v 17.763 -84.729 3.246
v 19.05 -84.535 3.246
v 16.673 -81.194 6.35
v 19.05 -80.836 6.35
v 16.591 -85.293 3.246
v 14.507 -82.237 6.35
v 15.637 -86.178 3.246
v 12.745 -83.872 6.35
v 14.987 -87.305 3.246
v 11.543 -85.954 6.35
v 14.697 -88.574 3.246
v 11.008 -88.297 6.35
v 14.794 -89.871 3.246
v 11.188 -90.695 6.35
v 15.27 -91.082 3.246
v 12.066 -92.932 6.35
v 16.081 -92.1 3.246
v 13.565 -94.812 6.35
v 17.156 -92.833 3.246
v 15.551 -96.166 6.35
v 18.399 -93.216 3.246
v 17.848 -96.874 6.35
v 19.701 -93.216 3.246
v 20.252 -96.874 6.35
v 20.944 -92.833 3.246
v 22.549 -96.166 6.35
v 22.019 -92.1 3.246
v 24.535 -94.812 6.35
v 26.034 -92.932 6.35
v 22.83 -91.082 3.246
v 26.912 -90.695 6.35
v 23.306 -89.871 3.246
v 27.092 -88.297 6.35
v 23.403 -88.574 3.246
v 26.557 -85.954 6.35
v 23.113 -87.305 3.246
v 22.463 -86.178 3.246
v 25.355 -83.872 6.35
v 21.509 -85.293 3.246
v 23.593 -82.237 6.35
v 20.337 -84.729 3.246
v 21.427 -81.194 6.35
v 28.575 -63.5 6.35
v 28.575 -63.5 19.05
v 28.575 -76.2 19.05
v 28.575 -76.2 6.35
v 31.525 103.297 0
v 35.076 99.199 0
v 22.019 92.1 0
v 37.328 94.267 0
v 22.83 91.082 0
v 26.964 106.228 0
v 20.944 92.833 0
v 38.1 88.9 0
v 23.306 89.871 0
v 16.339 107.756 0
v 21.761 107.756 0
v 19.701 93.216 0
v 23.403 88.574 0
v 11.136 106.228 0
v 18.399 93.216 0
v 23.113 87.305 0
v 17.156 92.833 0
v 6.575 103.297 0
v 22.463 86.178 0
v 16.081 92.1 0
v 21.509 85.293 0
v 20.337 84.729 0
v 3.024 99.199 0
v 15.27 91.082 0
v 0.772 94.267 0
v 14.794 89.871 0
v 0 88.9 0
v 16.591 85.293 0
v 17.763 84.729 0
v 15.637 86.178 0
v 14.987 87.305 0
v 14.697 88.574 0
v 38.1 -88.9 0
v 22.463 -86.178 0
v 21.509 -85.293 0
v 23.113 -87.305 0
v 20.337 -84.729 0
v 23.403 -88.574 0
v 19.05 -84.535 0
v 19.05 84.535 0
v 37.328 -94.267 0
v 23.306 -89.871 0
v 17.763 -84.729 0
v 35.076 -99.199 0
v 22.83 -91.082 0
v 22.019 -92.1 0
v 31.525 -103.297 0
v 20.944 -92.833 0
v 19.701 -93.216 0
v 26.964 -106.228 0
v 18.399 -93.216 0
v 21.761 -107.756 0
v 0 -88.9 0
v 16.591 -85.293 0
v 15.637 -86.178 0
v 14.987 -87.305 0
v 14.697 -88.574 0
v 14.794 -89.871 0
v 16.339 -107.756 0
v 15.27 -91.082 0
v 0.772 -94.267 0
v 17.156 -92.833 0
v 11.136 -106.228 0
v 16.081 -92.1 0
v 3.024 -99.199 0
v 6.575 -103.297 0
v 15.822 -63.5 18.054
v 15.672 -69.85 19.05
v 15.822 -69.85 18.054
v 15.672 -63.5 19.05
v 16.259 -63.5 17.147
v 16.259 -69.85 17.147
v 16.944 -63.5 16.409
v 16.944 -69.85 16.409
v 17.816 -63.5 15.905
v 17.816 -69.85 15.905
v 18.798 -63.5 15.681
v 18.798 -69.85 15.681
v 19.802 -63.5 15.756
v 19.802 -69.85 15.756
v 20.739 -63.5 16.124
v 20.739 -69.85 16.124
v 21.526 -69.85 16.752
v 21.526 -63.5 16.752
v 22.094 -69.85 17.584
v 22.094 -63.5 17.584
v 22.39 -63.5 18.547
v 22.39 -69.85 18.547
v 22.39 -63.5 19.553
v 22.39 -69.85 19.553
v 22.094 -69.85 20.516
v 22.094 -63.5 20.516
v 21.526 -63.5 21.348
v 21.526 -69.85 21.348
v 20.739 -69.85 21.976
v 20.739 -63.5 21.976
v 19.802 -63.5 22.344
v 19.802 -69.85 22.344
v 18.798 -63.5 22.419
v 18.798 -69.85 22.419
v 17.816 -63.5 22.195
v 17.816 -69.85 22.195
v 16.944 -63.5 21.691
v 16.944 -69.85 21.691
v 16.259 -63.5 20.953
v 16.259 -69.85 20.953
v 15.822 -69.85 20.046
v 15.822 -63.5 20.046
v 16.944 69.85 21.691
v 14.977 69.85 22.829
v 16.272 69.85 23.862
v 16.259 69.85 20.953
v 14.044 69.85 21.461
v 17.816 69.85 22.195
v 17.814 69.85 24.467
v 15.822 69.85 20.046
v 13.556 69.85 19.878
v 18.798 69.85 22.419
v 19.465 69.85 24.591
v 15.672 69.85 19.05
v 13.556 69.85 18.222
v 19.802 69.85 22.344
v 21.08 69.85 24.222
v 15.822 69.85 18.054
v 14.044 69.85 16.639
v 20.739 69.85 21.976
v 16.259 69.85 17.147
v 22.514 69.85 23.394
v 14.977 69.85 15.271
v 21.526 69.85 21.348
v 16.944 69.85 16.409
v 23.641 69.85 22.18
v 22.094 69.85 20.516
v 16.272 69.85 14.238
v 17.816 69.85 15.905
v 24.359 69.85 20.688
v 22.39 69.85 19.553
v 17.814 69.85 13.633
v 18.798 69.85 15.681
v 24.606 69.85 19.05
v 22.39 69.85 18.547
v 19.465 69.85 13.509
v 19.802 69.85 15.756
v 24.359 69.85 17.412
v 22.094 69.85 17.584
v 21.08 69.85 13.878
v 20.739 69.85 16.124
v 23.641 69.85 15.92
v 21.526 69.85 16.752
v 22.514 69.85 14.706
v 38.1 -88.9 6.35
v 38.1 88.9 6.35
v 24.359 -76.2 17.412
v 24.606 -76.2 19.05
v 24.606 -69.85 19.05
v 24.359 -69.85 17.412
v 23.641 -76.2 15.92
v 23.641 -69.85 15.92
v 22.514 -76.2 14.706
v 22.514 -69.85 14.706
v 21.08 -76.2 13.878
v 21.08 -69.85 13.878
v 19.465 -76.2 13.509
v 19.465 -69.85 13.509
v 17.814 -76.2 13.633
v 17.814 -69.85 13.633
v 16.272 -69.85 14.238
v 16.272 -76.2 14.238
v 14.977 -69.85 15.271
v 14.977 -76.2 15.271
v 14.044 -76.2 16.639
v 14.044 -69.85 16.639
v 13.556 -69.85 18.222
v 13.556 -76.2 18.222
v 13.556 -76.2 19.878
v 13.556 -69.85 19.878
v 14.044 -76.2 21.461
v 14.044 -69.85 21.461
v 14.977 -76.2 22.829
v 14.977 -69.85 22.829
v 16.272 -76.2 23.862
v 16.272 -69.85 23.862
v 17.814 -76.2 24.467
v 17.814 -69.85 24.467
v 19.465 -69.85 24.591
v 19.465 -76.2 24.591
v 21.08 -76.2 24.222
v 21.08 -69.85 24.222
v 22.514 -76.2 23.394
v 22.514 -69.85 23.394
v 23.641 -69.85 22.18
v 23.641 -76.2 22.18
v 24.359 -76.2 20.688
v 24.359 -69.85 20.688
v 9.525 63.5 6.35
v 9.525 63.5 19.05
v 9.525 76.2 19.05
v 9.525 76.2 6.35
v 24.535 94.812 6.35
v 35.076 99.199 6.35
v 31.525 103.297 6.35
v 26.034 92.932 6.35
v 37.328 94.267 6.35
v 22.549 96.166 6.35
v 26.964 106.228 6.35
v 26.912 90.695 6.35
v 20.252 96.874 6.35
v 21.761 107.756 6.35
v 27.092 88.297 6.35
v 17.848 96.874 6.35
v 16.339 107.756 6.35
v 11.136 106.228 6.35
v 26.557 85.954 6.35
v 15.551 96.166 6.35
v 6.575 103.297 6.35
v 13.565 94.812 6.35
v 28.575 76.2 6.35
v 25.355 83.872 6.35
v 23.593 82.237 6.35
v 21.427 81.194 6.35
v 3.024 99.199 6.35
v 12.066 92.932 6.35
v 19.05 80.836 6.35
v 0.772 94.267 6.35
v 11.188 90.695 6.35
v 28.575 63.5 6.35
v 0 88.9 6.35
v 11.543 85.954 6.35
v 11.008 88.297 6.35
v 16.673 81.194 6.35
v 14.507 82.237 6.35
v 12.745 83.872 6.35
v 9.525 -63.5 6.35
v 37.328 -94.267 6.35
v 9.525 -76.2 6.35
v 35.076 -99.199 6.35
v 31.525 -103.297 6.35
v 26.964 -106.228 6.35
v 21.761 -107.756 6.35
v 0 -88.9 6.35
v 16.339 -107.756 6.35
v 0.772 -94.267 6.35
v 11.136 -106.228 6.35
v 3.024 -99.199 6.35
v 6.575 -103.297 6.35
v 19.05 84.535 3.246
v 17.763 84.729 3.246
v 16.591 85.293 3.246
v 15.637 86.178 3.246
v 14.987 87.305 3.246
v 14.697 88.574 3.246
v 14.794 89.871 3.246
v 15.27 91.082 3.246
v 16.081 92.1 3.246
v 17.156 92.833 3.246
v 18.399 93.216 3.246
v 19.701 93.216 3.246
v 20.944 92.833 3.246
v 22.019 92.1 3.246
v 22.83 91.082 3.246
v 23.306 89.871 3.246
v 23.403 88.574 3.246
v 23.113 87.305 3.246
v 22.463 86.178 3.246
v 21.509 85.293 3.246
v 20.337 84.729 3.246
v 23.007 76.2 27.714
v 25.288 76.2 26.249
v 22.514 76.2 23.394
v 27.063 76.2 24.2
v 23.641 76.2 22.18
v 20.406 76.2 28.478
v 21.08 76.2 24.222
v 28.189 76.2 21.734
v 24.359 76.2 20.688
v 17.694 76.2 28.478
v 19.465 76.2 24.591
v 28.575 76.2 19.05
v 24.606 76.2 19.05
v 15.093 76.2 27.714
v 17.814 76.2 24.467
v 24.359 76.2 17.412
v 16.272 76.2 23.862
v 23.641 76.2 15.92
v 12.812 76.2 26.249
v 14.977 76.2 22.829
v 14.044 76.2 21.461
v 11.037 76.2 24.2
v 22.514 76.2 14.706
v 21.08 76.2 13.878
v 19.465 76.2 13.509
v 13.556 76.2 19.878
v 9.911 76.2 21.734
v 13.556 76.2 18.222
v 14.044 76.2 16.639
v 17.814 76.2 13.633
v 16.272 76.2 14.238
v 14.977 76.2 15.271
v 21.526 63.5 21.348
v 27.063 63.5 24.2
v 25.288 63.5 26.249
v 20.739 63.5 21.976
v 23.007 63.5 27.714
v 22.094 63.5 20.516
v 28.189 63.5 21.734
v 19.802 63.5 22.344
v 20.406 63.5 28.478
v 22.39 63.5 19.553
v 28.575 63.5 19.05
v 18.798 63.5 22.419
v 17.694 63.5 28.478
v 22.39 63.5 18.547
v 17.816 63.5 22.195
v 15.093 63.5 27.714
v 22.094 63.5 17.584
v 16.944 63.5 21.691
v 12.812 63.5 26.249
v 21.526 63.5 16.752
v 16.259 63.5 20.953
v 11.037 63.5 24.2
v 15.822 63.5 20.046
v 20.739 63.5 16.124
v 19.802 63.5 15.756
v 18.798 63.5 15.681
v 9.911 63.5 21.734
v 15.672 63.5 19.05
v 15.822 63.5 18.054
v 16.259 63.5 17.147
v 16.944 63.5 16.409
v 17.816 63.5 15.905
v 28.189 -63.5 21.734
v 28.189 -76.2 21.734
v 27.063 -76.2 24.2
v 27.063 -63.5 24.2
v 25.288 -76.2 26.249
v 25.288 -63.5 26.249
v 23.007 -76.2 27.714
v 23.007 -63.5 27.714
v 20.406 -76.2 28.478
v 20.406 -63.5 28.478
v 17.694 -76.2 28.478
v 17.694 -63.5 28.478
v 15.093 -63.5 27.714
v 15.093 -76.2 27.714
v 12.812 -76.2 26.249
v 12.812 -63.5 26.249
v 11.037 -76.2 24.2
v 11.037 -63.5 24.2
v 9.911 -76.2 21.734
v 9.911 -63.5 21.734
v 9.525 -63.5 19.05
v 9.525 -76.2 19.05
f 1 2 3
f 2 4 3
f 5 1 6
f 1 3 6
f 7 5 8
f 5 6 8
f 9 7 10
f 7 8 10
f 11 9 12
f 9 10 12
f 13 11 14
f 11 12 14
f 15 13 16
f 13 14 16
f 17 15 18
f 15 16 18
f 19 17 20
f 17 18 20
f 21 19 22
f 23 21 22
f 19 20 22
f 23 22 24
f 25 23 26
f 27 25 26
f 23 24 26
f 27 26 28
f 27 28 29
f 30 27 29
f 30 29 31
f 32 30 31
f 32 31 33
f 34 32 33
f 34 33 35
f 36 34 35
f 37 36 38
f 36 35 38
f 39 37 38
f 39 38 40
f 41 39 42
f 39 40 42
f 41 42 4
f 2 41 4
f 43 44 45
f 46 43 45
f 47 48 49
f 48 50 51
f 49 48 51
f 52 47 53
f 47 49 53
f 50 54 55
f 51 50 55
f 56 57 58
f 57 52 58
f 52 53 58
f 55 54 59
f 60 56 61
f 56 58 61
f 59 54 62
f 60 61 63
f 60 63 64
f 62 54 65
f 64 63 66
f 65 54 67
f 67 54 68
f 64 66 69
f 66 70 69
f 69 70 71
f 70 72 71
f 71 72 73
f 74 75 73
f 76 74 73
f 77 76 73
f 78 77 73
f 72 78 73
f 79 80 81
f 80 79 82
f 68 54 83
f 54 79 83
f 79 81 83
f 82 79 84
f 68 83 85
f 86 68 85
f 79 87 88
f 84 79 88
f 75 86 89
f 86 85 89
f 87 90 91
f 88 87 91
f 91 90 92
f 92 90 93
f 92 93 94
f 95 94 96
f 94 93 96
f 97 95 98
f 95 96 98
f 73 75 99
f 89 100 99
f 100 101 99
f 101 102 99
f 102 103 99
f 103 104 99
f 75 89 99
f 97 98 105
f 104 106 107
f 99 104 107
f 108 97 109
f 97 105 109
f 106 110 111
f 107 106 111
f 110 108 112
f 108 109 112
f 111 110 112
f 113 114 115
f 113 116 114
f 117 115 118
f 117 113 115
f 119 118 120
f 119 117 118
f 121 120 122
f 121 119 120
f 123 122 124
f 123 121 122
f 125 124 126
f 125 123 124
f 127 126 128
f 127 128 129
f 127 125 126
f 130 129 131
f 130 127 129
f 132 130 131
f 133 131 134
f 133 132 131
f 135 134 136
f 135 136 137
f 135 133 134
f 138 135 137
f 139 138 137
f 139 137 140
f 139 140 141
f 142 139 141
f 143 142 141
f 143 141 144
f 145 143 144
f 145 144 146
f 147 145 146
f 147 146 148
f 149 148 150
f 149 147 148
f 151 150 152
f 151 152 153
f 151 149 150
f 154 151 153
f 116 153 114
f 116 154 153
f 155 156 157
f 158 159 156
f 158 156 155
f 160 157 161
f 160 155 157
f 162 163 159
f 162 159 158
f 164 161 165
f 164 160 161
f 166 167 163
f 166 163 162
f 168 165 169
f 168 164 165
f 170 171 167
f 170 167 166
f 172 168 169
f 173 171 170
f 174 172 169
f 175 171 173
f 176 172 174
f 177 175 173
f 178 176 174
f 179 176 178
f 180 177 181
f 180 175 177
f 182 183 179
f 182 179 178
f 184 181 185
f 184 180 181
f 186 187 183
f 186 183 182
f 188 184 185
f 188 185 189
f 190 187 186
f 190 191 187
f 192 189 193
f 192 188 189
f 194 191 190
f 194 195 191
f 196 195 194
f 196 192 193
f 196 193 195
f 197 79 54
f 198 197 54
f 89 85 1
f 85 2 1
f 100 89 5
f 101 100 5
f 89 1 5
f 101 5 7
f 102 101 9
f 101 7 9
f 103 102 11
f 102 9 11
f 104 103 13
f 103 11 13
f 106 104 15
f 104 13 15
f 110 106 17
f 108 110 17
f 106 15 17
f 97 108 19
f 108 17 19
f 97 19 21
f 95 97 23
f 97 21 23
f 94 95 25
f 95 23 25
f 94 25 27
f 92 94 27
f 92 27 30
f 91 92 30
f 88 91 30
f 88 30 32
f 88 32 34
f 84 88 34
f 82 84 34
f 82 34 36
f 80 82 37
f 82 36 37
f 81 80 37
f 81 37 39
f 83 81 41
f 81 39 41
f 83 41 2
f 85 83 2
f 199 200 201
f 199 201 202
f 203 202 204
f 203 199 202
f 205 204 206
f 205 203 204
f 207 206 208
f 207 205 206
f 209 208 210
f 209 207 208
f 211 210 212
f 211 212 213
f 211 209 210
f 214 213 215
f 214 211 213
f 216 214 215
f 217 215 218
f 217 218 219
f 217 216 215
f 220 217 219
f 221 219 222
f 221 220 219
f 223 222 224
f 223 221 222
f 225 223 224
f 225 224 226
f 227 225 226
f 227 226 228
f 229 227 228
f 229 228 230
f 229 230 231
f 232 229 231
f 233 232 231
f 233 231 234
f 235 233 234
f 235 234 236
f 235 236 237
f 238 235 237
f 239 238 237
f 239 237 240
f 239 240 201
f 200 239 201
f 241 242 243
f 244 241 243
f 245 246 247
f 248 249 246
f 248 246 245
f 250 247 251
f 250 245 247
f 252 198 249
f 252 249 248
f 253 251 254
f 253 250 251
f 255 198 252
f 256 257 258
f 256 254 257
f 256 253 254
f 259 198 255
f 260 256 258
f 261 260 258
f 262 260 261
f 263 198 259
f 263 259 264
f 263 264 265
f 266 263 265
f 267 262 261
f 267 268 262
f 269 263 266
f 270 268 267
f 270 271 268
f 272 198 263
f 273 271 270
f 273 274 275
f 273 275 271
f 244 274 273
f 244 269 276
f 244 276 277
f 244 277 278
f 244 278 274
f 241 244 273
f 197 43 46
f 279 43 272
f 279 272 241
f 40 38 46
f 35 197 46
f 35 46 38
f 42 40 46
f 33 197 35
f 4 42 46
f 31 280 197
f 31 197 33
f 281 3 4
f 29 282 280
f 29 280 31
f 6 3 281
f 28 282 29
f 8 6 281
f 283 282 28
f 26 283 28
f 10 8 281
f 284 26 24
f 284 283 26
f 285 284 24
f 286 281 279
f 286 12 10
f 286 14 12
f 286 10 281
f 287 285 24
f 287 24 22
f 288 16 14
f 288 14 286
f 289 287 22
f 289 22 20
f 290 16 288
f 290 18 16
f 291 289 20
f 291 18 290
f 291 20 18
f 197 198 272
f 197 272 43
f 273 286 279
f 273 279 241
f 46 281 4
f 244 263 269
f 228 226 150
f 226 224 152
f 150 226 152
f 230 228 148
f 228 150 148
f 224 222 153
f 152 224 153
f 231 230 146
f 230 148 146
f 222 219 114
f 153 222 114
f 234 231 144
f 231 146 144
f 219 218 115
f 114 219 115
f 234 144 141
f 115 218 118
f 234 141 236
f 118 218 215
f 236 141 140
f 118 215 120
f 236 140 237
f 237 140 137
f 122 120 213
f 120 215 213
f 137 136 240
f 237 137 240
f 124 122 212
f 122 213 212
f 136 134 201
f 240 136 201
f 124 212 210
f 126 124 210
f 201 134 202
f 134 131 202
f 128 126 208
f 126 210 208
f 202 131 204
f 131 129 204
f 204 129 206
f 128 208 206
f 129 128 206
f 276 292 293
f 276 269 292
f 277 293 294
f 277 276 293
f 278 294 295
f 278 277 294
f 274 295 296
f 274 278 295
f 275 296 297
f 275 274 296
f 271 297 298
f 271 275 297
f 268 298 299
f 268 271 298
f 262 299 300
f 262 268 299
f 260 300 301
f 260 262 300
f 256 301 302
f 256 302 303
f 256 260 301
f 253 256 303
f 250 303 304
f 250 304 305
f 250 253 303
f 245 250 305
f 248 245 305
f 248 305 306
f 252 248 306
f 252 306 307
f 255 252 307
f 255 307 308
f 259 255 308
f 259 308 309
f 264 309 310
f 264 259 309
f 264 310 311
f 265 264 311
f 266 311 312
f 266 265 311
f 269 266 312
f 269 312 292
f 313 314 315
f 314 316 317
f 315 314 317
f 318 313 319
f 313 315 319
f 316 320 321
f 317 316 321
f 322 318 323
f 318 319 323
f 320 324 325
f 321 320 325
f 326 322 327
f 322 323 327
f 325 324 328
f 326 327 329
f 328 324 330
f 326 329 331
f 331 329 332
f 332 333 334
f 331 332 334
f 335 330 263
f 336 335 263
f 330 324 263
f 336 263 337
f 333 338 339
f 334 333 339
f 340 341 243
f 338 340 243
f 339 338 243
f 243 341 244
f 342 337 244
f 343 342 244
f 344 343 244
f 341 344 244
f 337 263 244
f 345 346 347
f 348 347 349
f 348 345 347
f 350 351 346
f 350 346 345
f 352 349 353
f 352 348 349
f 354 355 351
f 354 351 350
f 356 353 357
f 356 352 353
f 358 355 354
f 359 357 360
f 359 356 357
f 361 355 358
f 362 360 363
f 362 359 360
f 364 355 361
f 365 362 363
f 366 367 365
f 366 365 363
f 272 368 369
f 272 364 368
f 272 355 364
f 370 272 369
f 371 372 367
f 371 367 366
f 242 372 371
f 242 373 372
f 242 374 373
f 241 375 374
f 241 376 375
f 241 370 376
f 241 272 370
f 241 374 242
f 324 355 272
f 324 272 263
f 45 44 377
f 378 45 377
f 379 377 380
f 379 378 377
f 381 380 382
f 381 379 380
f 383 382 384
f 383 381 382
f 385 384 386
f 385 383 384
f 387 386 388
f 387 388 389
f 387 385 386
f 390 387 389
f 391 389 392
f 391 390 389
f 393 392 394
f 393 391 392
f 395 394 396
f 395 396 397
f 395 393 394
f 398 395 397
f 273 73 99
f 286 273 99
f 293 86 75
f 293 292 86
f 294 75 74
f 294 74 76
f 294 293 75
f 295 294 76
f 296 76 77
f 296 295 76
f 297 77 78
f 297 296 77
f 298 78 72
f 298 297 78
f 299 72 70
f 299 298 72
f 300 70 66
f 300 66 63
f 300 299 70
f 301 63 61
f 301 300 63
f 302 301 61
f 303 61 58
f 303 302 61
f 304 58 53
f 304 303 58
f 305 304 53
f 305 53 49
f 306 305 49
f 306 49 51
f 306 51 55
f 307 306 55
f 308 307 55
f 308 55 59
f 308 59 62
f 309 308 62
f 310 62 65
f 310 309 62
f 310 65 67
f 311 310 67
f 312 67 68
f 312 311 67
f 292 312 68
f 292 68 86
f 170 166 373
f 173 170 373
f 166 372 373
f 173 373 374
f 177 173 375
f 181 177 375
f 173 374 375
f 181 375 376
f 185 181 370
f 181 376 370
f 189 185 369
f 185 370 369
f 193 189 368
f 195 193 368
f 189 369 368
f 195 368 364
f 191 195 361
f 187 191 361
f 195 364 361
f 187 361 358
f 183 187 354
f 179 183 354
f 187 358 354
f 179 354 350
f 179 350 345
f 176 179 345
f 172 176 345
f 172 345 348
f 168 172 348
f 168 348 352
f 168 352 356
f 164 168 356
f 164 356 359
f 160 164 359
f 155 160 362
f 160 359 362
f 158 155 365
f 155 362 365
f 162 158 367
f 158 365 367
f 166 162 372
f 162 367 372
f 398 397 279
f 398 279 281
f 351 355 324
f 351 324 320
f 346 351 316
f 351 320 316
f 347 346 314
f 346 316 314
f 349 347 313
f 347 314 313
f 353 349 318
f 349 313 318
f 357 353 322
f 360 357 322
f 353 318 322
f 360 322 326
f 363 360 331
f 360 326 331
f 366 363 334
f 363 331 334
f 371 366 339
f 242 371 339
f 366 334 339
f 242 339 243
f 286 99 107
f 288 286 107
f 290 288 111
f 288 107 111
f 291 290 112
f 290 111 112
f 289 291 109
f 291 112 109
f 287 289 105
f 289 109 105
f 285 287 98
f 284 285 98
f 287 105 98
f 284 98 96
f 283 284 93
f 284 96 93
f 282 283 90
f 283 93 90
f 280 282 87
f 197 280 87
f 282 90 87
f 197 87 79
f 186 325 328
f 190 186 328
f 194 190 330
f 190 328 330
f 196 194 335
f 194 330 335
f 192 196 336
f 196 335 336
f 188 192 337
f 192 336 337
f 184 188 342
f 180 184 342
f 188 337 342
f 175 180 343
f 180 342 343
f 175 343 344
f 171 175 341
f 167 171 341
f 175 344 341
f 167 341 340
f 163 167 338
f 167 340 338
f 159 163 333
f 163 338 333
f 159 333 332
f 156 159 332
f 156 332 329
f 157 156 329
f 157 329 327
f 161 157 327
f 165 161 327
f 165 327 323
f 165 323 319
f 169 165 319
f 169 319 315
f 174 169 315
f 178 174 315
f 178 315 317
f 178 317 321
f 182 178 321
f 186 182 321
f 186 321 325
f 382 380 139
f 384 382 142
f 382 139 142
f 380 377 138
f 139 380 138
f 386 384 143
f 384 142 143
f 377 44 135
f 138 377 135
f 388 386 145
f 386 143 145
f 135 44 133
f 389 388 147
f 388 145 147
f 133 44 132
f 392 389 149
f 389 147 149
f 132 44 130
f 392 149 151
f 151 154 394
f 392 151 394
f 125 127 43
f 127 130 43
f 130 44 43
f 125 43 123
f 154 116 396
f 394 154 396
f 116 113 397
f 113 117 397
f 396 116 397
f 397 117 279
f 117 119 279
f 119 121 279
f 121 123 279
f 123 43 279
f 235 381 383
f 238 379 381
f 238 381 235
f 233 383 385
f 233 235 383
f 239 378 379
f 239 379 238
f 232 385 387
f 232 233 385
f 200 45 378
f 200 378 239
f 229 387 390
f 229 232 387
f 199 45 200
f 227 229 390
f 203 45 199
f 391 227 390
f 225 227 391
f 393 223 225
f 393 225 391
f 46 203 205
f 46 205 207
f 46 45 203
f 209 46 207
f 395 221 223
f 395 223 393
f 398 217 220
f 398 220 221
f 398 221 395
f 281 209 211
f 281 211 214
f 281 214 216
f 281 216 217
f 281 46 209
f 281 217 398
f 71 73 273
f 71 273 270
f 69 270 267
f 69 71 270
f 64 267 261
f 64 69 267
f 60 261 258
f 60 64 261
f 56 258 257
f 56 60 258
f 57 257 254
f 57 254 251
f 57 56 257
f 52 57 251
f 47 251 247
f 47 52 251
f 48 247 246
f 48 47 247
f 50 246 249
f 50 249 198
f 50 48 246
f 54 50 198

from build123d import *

# Parameters (mm, degrees)
BOSS_EXTRUDE1_DEPTH                              = 6.35
SKETCH6_W                                        = 19.05
SKETCH6_H                                        = 12.7
BOSS_EXTRUDE4_DEPTH                              = 12.7
BOSS_EXTRUDE7_DEPTH                              = 12.7
CBORE_FOR_1_4_SOCKET_HEAD_CAP_SCREW1_D           = 6.7564
CBORE_FOR_1_4_SOCKET_HEAD_CAP_SCREW1_CBORE_D     = 11.1125
CBORE_FOR_1_4_SOCKET_HEAD_CAP_SCREW1_CBORE_DEPTH = 6.35


with BuildPart() as part:
    # Sketch1 → Boss-Extrude1 (new body)
    with BuildSketch(Plane.XY):
        with BuildLine():
            Line((0, 0), (0, 88.9))
            ThreePointArc((0, 88.9), (19.05, 107.95), (38.1, 88.9))
            Line((38.1, 88.9), (38.1, 0))
            Line((38.1, 0), (0, 0))
        make_face()
    extrude(amount=BOSS_EXTRUDE1_DEPTH)

    # Sketch5 → CSK for 5/16 Flat Head Machine Screw (100)1 (revolve, cut)
    with BuildSketch(Plane(origin=(19.05, 88.9, 6.35), x_dir=(0, -1, 0), z_dir=(1, 0, 0))):
        Polygon((0, 0), (0, 6.35), (4.36499, 6.35), (4.36499, 3.104257477), (8.0645, 0), align=None)
    revolve(axis=Axis((19.05, 88.9, 12.7), (0, 0, -1)), mode=Mode.SUBTRACT)

    # Sketch6 → Boss-Extrude4 (add)
    with BuildSketch(Plane.XY.offset(6.35)):
        with Locations((19.05, 69.85)):
            Rectangle(SKETCH6_W, SKETCH6_H)
    extrude(amount=BOSS_EXTRUDE4_DEPTH)

    # Sketch12 → Boss-Extrude7 (add)
    with BuildSketch(Plane(origin=(0, 76.2, 0), x_dir=(1, 0, 0), z_dir=(0, 1, 0))):
        with BuildLine():
            Line((9.525, -19.05), (28.575, -19.05))
            ThreePointArc((28.575, -19.05), (19.05, -28.575), (9.525, -19.05))
        make_face()
    extrude(amount=-BOSS_EXTRUDE7_DEPTH)

    # CBORE for 1/4 Socket Head Cap Screw1 (through all)
    with Locations(Plane(origin=(0, 76.2, 0), x_dir=(1, 0, 0), z_dir=(0, 1, 0))):
        with Locations((19.05, -19.05)):
            CounterBoreHole(CBORE_FOR_1_4_SOCKET_HEAD_CAP_SCREW1_D / 2, CBORE_FOR_1_4_SOCKET_HEAD_CAP_SCREW1_CBORE_D / 2, CBORE_FOR_1_4_SOCKET_HEAD_CAP_SCREW1_CBORE_DEPTH)

    # Mirror1: part across plane


with BuildPart() as part_1:
    add(part.part)
    add(part.part.mirror(Plane(origin=(38.1, 0, 6.35), x_dir=(0, 0, 1), z_dir=(0, 1, 0))))


solid = part_1.part
